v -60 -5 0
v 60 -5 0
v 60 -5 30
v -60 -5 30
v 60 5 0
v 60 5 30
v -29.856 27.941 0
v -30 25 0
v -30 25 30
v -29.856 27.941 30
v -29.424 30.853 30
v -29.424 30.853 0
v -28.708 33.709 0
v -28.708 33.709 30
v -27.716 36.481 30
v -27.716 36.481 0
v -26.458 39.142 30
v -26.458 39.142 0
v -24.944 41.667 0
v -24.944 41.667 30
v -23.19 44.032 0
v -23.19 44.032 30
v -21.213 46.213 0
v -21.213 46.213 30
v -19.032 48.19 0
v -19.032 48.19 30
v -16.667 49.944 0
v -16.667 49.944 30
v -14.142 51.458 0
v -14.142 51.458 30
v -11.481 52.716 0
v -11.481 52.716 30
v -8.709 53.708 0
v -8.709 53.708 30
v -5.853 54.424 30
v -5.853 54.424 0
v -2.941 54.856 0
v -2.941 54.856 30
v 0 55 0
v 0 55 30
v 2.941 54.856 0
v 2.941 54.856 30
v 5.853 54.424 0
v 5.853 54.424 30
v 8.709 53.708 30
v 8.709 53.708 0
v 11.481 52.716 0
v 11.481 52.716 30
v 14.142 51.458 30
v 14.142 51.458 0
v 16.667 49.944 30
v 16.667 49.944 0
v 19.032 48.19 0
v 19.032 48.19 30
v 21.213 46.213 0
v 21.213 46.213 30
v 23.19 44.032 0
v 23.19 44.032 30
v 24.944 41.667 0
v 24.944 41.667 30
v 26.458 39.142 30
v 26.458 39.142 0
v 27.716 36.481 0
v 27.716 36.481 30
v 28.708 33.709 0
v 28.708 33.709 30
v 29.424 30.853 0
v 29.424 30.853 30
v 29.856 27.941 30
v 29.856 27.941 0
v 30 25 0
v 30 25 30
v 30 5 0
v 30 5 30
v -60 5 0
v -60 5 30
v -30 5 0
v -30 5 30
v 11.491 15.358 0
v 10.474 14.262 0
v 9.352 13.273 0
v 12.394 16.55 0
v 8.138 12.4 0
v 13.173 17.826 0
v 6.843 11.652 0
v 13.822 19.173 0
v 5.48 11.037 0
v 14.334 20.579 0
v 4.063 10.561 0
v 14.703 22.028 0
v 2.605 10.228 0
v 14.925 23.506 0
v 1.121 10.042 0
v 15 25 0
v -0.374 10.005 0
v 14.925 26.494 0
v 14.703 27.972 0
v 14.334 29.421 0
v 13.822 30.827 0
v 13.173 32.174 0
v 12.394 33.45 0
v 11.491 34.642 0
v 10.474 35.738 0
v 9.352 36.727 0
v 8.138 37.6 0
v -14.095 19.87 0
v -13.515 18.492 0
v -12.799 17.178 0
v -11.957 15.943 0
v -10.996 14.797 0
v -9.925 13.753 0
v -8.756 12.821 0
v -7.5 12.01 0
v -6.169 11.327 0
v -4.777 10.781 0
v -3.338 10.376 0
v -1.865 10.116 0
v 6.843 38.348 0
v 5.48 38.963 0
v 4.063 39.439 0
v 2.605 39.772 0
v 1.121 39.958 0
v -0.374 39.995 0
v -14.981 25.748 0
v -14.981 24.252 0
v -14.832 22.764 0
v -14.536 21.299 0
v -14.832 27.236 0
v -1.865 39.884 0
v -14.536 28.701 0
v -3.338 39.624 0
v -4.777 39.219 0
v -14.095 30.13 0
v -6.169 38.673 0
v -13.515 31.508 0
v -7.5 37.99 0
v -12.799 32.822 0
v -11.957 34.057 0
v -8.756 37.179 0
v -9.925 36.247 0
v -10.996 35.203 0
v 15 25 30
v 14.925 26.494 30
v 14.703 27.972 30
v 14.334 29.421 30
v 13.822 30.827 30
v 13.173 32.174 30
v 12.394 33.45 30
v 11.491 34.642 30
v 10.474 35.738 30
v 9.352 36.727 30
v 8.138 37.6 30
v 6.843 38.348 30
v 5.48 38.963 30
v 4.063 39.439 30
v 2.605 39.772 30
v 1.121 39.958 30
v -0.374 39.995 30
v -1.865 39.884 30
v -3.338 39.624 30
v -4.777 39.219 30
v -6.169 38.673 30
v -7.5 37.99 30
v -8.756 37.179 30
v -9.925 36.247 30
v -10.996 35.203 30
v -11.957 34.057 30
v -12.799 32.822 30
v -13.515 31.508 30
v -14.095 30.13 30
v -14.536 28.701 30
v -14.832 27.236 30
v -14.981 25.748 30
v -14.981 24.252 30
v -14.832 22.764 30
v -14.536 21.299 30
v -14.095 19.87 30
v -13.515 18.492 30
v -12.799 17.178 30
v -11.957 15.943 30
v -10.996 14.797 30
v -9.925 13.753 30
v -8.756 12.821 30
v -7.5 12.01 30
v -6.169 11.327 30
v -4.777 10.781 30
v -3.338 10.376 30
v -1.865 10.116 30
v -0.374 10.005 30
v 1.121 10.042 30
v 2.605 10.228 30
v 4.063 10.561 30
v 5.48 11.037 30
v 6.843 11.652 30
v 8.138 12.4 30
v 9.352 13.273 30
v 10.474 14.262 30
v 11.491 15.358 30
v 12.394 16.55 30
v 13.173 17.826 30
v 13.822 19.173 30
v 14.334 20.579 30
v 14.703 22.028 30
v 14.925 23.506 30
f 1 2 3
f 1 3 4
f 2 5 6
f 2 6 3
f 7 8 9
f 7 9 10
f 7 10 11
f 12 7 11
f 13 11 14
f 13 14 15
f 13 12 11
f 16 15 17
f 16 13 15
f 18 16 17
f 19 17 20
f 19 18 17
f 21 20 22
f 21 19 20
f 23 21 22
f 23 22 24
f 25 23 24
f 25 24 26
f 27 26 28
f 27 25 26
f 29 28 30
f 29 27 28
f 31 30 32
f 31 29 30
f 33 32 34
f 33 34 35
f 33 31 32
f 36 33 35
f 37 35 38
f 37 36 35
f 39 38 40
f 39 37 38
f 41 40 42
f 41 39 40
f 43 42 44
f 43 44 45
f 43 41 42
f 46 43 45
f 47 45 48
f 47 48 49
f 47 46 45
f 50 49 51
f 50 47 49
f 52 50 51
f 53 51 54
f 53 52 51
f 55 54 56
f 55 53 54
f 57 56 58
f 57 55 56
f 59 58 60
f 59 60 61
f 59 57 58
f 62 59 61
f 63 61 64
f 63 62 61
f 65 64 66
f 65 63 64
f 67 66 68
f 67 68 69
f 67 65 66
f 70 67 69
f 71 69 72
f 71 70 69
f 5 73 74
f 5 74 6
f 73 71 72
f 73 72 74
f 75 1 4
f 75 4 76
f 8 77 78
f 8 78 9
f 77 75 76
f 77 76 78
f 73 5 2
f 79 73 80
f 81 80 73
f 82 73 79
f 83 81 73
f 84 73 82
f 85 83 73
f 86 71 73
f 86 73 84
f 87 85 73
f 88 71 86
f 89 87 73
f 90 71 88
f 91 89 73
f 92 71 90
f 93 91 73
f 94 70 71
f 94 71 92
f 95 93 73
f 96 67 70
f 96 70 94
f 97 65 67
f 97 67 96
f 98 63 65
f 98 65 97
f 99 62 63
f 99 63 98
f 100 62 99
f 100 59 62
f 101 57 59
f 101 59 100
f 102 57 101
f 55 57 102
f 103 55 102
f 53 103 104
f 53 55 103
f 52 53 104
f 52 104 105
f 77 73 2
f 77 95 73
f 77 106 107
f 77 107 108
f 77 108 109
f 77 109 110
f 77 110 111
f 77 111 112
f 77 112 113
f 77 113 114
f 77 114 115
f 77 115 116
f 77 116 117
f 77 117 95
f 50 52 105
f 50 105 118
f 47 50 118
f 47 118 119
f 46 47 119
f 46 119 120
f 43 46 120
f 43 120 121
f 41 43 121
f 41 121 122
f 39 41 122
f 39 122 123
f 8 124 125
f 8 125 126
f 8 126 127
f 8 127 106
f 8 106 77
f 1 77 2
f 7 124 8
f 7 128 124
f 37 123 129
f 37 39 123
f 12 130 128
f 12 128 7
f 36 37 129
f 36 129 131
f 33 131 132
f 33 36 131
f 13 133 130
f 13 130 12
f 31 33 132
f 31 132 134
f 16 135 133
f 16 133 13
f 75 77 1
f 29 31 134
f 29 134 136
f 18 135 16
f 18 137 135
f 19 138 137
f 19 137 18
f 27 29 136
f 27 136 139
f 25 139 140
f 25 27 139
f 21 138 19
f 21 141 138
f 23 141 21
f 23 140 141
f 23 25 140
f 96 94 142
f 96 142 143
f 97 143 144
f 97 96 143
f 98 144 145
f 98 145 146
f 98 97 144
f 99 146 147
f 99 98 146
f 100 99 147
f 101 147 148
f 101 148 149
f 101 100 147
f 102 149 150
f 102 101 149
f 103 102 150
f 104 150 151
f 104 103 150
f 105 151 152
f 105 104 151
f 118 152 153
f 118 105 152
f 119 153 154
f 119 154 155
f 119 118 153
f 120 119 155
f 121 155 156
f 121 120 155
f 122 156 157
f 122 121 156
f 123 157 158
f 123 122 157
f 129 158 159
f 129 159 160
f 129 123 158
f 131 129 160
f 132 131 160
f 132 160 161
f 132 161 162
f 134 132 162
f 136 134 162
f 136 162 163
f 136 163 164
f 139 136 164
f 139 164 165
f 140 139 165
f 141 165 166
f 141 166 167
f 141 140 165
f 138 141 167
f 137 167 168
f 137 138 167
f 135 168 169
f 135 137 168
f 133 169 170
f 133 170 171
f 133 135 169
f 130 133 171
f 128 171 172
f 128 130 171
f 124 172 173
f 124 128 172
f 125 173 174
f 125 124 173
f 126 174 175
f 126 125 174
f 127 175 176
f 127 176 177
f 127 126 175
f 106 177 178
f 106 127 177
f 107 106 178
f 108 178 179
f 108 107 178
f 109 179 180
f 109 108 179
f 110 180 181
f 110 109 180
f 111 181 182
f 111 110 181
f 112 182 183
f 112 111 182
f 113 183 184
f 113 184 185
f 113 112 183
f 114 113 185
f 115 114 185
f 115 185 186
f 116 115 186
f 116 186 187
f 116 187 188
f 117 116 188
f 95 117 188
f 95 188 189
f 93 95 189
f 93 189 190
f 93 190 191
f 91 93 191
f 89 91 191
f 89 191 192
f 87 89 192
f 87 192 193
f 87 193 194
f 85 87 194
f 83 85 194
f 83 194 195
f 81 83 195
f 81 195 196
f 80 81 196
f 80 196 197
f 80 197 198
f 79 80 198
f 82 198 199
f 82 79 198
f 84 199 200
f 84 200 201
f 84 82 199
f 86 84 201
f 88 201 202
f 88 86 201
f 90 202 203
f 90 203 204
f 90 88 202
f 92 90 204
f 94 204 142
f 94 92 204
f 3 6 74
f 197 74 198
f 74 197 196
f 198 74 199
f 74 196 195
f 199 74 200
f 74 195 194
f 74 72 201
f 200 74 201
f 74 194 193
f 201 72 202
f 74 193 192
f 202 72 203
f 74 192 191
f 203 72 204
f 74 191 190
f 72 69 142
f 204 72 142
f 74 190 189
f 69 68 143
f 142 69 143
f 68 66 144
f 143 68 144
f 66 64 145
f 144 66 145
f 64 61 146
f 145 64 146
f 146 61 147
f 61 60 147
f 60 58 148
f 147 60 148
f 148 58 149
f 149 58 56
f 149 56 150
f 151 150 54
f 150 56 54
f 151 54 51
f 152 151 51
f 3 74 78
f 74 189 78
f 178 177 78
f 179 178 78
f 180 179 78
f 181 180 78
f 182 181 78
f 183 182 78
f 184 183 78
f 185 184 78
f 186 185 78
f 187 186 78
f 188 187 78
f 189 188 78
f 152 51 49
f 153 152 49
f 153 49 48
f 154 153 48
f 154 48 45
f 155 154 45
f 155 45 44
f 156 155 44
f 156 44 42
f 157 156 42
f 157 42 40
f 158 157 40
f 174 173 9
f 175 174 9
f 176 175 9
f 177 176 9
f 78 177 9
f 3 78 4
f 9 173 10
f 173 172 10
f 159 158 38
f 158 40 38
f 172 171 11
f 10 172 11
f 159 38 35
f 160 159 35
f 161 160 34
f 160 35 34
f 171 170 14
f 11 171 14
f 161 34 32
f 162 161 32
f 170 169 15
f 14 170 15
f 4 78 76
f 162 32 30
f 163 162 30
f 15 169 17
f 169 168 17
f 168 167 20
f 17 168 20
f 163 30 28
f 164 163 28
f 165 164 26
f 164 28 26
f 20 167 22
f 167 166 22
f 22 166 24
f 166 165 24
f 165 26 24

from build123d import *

# Parameters (mm, degrees)
SKETCH1_R           = 15
BOSS_EXTRUDE1_DEPTH = 30


with BuildPart() as part:
    # Sketch1 → Boss-Extrude1 (new body)
    with BuildSketch(Plane.XY):
        with BuildLine():
            Line((30, 25), (30, 5))
            Line((30, 5), (60, 5))
            Line((60, 5), (60, -5))
            Line((60, -5), (-60, -5))
            Line((-60, -5), (-60, 5))
            Line((-60, 5), (-30, 5))
            Line((-30, 5), (-30, 25))
            ThreePointArc((-30, 25), (0, 55), (30, 25))
        make_face()
        with Locations((0, 25)):
            Circle(SKETCH1_R, mode=Mode.SUBTRACT)
    extrude(amount=BOSS_EXTRUDE1_DEPTH)


solid = part.part
